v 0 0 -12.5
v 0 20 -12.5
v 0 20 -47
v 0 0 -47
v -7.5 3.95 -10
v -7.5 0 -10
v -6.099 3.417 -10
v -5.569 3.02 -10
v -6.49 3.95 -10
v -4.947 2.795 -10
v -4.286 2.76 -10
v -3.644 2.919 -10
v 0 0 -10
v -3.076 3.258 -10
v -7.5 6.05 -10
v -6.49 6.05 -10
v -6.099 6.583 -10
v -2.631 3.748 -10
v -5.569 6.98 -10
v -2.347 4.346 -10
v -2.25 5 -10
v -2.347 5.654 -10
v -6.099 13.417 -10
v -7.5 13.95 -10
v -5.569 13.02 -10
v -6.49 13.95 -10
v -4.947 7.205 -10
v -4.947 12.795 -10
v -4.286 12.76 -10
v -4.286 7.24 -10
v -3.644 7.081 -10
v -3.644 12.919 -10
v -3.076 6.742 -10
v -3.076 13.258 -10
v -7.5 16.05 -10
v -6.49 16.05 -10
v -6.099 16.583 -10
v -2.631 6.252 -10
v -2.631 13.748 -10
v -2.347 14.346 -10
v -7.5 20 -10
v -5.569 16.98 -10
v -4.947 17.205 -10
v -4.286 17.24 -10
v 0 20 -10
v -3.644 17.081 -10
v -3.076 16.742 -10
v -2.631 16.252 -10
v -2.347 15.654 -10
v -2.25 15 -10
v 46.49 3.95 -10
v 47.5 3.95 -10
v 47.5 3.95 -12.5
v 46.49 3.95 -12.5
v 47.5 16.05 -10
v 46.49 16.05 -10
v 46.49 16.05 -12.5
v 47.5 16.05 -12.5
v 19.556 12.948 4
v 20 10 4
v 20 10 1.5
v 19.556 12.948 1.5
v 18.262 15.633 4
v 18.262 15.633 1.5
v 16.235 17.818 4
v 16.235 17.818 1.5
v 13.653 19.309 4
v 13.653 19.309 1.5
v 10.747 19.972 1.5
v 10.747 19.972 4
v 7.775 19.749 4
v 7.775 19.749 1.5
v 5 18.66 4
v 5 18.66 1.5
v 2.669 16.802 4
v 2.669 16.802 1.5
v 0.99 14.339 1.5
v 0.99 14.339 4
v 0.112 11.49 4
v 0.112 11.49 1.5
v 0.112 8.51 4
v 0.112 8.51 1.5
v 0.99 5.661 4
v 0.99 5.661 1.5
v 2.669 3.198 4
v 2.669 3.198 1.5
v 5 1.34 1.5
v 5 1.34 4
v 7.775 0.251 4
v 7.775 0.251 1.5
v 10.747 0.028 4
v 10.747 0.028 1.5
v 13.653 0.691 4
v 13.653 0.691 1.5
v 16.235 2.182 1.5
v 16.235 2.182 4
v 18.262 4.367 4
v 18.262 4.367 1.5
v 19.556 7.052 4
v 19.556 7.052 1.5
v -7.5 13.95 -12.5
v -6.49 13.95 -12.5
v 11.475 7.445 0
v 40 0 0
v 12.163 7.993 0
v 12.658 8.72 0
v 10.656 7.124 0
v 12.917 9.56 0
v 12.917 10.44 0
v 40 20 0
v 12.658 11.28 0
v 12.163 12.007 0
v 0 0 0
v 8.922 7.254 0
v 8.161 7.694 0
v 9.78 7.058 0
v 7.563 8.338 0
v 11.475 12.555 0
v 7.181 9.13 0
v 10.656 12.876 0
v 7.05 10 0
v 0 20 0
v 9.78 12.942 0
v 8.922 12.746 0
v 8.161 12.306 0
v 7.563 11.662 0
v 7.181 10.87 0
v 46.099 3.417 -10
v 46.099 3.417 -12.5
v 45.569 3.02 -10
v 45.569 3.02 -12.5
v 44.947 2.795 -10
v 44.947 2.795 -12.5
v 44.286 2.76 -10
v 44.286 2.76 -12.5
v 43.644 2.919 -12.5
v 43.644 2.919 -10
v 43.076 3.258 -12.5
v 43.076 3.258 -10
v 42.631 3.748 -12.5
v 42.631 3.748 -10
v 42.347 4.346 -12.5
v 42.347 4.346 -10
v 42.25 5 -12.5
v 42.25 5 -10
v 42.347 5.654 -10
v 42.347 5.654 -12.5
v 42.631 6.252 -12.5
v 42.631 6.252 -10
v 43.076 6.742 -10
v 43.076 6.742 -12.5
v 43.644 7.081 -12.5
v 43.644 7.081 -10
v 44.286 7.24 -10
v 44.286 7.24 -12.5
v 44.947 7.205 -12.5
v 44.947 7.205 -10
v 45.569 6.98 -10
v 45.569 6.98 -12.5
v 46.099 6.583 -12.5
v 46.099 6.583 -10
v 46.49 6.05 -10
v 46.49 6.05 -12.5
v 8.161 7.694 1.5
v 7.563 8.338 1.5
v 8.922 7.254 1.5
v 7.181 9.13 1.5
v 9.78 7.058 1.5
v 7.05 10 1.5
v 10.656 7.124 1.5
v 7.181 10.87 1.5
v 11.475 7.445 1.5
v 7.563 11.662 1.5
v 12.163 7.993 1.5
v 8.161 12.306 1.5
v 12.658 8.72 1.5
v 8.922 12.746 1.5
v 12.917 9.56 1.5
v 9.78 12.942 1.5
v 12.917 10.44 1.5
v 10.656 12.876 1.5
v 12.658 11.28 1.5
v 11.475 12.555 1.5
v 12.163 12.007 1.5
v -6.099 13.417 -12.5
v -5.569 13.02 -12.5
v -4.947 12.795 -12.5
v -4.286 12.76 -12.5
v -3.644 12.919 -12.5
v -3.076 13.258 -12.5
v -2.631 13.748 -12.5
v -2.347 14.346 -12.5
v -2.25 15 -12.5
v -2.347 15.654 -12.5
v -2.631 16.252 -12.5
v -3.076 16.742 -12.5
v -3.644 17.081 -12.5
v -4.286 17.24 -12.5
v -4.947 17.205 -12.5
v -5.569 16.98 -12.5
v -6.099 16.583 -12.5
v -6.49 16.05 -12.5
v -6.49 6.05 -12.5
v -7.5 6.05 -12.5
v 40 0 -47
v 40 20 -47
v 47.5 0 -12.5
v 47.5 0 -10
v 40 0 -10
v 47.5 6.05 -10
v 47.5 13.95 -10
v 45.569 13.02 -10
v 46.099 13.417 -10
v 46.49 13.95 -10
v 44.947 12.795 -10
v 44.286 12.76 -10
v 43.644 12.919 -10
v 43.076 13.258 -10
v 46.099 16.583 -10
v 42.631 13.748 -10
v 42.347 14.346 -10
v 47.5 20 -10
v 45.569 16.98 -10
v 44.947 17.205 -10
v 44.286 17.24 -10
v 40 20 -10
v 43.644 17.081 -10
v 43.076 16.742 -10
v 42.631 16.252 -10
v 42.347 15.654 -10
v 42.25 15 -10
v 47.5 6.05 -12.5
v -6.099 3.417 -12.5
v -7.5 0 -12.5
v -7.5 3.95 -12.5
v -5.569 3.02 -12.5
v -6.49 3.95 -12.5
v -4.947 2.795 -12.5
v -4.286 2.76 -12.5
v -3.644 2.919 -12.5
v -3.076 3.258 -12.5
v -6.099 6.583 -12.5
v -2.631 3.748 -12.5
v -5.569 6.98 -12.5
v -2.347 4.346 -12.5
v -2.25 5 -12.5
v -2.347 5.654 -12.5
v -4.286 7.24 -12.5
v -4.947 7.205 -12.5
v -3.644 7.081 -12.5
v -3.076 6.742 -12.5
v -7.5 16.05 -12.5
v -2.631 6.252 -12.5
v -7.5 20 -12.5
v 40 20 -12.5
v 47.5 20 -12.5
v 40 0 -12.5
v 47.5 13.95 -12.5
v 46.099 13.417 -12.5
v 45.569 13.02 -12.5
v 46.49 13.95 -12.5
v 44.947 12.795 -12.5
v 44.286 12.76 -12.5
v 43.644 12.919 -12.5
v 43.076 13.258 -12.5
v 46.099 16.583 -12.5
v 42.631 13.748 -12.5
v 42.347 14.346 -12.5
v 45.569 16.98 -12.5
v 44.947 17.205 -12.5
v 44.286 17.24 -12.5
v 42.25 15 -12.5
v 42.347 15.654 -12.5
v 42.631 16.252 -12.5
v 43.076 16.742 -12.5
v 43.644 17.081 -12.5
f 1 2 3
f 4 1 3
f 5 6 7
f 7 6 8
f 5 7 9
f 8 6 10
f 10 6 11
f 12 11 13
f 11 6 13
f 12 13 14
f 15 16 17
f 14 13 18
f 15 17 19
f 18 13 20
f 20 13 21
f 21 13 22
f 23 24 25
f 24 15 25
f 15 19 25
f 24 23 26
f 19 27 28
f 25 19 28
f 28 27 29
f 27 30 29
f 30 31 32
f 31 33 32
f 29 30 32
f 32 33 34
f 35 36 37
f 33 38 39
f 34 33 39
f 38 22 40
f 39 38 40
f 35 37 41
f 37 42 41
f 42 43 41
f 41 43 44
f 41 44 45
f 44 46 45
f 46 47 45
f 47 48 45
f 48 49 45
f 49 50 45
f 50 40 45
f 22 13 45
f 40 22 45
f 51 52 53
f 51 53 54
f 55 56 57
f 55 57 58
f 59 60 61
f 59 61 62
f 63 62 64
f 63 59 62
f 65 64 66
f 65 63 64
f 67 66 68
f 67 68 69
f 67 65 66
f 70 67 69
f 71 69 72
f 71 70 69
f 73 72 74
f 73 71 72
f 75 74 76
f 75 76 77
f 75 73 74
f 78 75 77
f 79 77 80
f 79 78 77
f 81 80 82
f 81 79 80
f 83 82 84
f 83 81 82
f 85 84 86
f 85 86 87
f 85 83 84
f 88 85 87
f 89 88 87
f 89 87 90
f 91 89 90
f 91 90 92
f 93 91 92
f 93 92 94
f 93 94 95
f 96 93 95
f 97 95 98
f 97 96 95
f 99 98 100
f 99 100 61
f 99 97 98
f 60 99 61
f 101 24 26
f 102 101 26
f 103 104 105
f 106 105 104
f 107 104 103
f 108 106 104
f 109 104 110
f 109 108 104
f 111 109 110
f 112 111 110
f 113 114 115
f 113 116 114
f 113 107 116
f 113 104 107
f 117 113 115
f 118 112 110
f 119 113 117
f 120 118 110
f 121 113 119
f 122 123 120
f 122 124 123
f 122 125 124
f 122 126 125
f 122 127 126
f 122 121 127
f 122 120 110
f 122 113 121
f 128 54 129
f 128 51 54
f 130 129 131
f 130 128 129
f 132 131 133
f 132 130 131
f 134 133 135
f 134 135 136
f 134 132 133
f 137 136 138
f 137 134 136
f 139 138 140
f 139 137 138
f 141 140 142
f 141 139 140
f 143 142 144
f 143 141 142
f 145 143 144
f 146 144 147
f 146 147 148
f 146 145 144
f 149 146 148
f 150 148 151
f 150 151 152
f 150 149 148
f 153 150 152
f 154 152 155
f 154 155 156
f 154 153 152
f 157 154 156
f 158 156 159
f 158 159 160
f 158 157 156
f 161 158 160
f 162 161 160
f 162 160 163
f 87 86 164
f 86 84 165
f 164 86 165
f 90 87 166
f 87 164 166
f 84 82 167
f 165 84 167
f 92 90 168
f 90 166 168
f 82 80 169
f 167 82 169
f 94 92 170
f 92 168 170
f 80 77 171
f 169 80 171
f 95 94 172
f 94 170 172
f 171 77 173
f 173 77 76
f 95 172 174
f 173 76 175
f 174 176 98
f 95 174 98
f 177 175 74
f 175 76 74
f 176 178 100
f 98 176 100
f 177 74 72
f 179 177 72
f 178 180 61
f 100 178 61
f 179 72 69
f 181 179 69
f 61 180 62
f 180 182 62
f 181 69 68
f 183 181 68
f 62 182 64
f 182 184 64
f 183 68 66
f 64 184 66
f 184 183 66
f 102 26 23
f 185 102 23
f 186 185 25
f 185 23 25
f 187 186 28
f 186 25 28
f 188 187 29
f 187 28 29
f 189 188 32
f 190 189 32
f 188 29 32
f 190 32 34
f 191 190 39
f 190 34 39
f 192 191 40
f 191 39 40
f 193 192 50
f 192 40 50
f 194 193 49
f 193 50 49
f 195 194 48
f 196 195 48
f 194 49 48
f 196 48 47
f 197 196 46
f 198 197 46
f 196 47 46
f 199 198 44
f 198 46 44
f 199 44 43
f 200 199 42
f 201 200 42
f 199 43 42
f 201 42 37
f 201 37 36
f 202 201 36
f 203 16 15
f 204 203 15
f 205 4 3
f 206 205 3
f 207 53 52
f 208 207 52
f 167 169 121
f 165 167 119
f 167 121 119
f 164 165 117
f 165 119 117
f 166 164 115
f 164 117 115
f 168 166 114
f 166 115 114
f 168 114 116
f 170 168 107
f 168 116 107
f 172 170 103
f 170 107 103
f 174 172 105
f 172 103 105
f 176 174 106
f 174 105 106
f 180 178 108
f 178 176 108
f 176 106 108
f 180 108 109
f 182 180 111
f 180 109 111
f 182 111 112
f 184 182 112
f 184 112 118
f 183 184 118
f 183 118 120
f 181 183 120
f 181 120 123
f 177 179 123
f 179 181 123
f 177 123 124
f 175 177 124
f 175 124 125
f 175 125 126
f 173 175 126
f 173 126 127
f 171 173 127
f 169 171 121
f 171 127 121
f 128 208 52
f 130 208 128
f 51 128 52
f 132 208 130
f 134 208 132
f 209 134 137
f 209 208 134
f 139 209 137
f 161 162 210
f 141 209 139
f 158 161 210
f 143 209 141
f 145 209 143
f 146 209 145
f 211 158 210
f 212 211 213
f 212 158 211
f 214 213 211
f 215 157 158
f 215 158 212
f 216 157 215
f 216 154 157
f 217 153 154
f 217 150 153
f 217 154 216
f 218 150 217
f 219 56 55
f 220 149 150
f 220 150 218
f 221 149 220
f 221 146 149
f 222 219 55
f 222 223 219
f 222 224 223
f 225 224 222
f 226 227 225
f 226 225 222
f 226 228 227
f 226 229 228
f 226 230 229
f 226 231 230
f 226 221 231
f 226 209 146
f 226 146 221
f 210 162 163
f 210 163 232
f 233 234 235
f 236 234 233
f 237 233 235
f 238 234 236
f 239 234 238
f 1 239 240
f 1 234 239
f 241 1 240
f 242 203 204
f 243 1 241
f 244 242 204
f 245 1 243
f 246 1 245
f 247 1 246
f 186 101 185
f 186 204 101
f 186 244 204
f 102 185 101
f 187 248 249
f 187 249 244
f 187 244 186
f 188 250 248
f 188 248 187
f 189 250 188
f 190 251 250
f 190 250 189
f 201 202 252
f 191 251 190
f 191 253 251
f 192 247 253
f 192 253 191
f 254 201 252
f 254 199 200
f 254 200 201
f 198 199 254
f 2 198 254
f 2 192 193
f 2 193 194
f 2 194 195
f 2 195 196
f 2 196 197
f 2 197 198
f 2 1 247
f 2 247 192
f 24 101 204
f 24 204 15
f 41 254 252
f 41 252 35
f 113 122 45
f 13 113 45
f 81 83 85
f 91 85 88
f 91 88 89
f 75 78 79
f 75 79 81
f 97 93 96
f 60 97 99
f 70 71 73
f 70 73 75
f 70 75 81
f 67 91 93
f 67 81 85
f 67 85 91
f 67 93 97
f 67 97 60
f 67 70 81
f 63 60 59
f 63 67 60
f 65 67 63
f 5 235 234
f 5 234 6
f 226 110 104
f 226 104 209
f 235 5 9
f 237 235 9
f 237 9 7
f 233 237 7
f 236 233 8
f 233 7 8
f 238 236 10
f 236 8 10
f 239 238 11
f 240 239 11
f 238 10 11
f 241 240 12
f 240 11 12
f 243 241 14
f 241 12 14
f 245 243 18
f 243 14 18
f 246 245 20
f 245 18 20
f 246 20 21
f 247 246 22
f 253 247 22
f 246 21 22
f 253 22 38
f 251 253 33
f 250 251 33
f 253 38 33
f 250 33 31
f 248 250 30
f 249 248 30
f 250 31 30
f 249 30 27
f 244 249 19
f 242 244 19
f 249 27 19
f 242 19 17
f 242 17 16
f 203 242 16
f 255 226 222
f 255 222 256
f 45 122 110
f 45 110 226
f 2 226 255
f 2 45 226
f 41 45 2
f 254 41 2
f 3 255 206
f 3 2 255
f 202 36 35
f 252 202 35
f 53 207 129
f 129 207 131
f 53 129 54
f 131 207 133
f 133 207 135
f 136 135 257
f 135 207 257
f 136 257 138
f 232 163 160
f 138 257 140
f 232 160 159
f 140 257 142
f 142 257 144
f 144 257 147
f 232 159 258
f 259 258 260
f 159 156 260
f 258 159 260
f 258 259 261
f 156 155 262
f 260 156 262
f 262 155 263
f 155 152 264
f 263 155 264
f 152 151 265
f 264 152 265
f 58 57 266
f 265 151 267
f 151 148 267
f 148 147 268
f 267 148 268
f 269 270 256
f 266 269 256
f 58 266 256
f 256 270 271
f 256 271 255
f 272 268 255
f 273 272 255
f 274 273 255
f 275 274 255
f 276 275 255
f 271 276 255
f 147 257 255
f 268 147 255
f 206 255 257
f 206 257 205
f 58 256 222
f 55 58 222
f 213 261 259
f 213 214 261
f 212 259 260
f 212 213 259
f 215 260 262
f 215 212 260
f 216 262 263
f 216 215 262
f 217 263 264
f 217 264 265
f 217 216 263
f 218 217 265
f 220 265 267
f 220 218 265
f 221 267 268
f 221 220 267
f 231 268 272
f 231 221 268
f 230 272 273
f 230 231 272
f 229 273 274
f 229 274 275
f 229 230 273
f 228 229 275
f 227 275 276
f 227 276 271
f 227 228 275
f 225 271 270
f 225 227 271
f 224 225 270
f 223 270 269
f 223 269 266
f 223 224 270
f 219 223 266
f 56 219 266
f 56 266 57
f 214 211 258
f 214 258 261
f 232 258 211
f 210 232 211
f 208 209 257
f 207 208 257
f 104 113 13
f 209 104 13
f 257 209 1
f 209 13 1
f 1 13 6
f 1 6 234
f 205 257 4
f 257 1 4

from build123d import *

# Parameters (mm, degrees)
SKETCH1_W           = 47
SKETCH1_H           = 20
BOSS_EXTRUDE1_DEPTH = 40
SKETCH2_R           = 2.95
BOSS_EXTRUDE5_DEPTH = 4
SKETCH5_R           = 10
BOSS_EXTRUDE6_DEPTH = 2.5
SKETCH6_W           = 2.5
SKETCH6_H           = 20
BOSS_EXTRUDE7_DEPTH = 7.5
CUT_EXTRUDE1_REACH  = 60.043
SKETCH7_R           = 2.25


with BuildPart() as part:
    # Sketch1 → Boss-Extrude1 (new body)
    with BuildSketch(Plane(origin=(0, 0, 0), x_dir=(0, 0, -1), z_dir=(1, 0, 0))):
        with Locations((23.5, 10)):
            Rectangle(SKETCH1_W, SKETCH1_H)
    extrude(amount=BOSS_EXTRUDE1_DEPTH)

    # Sketch2 → Boss-Extrude5 (add)
    with BuildSketch(Plane.XY):
        with Locations(Location((10, 10, 0), (0, 0, 180))):
            Circle(SKETCH2_R)
    extrude(amount=BOSS_EXTRUDE5_DEPTH)

    # Sketch5 → Boss-Extrude6 (add)
    with BuildSketch(Plane.XY.offset(4)):
        with Locations((10, 10)):
            Circle(SKETCH5_R)
    extrude(amount=-BOSS_EXTRUDE6_DEPTH)

    # Sketch6 → Boss-Extrude7 (add)
    with BuildSketch(Plane.ZY):
        with Locations((-11.25, 10)):
            Rectangle(SKETCH6_W, SKETCH6_H)
    boss_extrude7 = extrude(amount=BOSS_EXTRUDE7_DEPTH)

    # Sketch7 → Cut-Extrude1 (cut, up to next)
    with BuildSketch(Plane.XY.offset(-10), mode=Mode.PRIVATE) as cut_extrude1_sk1:
        with Locations((-4.5, 15)):
            Circle(SKETCH7_R)
    cut_extrude1_tool1 = extrude(cut_extrude1_sk1.sketch, amount=-CUT_EXTRUDE1_REACH, mode=Mode.PRIVATE) & part.part
    # Sketch7 → Cut-Extrude1 (cut, up to next)
    with BuildSketch(Plane.XY.offset(-10), mode=Mode.PRIVATE) as cut_extrude1_sk2:
        with BuildLine():
            ThreePointArc((-6.489974874, 13.95), (-6.75, 15), (-6.489974874, 16.05))
            Line((-6.489974874, 16.05), (-7.5, 16.05))
            Line((-7.5, 16.05), (-7.5, 13.95))
            Line((-7.5, 13.95), (-6.489974874, 13.95))
        make_face()
    cut_extrude1_tool2 = extrude(cut_extrude1_sk2.sketch, amount=-CUT_EXTRUDE1_REACH, mode=Mode.PRIVATE) & part.part
    # Sketch7 → Cut-Extrude1 (cut, up to next)
    with BuildSketch(Plane.XY.offset(-10), mode=Mode.PRIVATE) as cut_extrude1_sk3:
        with Locations((-4.5, 5)):
            Circle(SKETCH7_R)
    cut_extrude1_tool3 = extrude(cut_extrude1_sk3.sketch, amount=-CUT_EXTRUDE1_REACH, mode=Mode.PRIVATE) & part.part
    # Sketch7 → Cut-Extrude1 (cut, up to next)
    with BuildSketch(Plane.XY.offset(-10), mode=Mode.PRIVATE) as cut_extrude1_sk4:
        with BuildLine():
            Line((-6.489974874, 6.05), (-7.5, 6.05))
            Line((-7.5, 6.05), (-7.5, 3.95))
            Line((-7.5, 3.95), (-6.489974874, 3.95))
            ThreePointArc((-6.489974874, 3.95), (-6.75, 5), (-6.489974874, 6.05))
        make_face()
    cut_extrude1_tool4 = extrude(cut_extrude1_sk4.sketch, amount=-CUT_EXTRUDE1_REACH, mode=Mode.PRIVATE) & part.part
    cut_extrude1_1 = cut_extrude1_tool1.solids().sort_by_distance((-4.5, 15, -10))[0]
    add(cut_extrude1_1, mode=Mode.SUBTRACT)
    cut_extrude1_2 = cut_extrude1_tool2.solids().sort_by_distance((-7.079182, 15, -10))[0]
    add(cut_extrude1_2, mode=Mode.SUBTRACT)
    cut_extrude1_3 = cut_extrude1_tool3.solids().sort_by_distance((-4.5, 5, -10))[0]
    add(cut_extrude1_3, mode=Mode.SUBTRACT)
    cut_extrude1_4 = cut_extrude1_tool4.solids().sort_by_distance((-7.079182, 5, -10))[0]
    add(cut_extrude1_4, mode=Mode.SUBTRACT)
    cut_extrude1 = cut_extrude1_1 + cut_extrude1_2 + cut_extrude1_3 + cut_extrude1_4  # Cut-Extrude1 as one shape, for the pattern or mirror that repeats it

    # Mirror1: Boss-Extrude7, Cut-Extrude1 across plane
    add(boss_extrude7.mirror(Plane(origin=(20, 0, 0), x_dir=(0, 0, 1), z_dir=(1, 0, 0))))
    add(cut_extrude1.mirror(Plane(origin=(20, 0, 0), x_dir=(0, 0, 1), z_dir=(1, 0, 0))), mode=Mode.SUBTRACT)


solid = part.part
